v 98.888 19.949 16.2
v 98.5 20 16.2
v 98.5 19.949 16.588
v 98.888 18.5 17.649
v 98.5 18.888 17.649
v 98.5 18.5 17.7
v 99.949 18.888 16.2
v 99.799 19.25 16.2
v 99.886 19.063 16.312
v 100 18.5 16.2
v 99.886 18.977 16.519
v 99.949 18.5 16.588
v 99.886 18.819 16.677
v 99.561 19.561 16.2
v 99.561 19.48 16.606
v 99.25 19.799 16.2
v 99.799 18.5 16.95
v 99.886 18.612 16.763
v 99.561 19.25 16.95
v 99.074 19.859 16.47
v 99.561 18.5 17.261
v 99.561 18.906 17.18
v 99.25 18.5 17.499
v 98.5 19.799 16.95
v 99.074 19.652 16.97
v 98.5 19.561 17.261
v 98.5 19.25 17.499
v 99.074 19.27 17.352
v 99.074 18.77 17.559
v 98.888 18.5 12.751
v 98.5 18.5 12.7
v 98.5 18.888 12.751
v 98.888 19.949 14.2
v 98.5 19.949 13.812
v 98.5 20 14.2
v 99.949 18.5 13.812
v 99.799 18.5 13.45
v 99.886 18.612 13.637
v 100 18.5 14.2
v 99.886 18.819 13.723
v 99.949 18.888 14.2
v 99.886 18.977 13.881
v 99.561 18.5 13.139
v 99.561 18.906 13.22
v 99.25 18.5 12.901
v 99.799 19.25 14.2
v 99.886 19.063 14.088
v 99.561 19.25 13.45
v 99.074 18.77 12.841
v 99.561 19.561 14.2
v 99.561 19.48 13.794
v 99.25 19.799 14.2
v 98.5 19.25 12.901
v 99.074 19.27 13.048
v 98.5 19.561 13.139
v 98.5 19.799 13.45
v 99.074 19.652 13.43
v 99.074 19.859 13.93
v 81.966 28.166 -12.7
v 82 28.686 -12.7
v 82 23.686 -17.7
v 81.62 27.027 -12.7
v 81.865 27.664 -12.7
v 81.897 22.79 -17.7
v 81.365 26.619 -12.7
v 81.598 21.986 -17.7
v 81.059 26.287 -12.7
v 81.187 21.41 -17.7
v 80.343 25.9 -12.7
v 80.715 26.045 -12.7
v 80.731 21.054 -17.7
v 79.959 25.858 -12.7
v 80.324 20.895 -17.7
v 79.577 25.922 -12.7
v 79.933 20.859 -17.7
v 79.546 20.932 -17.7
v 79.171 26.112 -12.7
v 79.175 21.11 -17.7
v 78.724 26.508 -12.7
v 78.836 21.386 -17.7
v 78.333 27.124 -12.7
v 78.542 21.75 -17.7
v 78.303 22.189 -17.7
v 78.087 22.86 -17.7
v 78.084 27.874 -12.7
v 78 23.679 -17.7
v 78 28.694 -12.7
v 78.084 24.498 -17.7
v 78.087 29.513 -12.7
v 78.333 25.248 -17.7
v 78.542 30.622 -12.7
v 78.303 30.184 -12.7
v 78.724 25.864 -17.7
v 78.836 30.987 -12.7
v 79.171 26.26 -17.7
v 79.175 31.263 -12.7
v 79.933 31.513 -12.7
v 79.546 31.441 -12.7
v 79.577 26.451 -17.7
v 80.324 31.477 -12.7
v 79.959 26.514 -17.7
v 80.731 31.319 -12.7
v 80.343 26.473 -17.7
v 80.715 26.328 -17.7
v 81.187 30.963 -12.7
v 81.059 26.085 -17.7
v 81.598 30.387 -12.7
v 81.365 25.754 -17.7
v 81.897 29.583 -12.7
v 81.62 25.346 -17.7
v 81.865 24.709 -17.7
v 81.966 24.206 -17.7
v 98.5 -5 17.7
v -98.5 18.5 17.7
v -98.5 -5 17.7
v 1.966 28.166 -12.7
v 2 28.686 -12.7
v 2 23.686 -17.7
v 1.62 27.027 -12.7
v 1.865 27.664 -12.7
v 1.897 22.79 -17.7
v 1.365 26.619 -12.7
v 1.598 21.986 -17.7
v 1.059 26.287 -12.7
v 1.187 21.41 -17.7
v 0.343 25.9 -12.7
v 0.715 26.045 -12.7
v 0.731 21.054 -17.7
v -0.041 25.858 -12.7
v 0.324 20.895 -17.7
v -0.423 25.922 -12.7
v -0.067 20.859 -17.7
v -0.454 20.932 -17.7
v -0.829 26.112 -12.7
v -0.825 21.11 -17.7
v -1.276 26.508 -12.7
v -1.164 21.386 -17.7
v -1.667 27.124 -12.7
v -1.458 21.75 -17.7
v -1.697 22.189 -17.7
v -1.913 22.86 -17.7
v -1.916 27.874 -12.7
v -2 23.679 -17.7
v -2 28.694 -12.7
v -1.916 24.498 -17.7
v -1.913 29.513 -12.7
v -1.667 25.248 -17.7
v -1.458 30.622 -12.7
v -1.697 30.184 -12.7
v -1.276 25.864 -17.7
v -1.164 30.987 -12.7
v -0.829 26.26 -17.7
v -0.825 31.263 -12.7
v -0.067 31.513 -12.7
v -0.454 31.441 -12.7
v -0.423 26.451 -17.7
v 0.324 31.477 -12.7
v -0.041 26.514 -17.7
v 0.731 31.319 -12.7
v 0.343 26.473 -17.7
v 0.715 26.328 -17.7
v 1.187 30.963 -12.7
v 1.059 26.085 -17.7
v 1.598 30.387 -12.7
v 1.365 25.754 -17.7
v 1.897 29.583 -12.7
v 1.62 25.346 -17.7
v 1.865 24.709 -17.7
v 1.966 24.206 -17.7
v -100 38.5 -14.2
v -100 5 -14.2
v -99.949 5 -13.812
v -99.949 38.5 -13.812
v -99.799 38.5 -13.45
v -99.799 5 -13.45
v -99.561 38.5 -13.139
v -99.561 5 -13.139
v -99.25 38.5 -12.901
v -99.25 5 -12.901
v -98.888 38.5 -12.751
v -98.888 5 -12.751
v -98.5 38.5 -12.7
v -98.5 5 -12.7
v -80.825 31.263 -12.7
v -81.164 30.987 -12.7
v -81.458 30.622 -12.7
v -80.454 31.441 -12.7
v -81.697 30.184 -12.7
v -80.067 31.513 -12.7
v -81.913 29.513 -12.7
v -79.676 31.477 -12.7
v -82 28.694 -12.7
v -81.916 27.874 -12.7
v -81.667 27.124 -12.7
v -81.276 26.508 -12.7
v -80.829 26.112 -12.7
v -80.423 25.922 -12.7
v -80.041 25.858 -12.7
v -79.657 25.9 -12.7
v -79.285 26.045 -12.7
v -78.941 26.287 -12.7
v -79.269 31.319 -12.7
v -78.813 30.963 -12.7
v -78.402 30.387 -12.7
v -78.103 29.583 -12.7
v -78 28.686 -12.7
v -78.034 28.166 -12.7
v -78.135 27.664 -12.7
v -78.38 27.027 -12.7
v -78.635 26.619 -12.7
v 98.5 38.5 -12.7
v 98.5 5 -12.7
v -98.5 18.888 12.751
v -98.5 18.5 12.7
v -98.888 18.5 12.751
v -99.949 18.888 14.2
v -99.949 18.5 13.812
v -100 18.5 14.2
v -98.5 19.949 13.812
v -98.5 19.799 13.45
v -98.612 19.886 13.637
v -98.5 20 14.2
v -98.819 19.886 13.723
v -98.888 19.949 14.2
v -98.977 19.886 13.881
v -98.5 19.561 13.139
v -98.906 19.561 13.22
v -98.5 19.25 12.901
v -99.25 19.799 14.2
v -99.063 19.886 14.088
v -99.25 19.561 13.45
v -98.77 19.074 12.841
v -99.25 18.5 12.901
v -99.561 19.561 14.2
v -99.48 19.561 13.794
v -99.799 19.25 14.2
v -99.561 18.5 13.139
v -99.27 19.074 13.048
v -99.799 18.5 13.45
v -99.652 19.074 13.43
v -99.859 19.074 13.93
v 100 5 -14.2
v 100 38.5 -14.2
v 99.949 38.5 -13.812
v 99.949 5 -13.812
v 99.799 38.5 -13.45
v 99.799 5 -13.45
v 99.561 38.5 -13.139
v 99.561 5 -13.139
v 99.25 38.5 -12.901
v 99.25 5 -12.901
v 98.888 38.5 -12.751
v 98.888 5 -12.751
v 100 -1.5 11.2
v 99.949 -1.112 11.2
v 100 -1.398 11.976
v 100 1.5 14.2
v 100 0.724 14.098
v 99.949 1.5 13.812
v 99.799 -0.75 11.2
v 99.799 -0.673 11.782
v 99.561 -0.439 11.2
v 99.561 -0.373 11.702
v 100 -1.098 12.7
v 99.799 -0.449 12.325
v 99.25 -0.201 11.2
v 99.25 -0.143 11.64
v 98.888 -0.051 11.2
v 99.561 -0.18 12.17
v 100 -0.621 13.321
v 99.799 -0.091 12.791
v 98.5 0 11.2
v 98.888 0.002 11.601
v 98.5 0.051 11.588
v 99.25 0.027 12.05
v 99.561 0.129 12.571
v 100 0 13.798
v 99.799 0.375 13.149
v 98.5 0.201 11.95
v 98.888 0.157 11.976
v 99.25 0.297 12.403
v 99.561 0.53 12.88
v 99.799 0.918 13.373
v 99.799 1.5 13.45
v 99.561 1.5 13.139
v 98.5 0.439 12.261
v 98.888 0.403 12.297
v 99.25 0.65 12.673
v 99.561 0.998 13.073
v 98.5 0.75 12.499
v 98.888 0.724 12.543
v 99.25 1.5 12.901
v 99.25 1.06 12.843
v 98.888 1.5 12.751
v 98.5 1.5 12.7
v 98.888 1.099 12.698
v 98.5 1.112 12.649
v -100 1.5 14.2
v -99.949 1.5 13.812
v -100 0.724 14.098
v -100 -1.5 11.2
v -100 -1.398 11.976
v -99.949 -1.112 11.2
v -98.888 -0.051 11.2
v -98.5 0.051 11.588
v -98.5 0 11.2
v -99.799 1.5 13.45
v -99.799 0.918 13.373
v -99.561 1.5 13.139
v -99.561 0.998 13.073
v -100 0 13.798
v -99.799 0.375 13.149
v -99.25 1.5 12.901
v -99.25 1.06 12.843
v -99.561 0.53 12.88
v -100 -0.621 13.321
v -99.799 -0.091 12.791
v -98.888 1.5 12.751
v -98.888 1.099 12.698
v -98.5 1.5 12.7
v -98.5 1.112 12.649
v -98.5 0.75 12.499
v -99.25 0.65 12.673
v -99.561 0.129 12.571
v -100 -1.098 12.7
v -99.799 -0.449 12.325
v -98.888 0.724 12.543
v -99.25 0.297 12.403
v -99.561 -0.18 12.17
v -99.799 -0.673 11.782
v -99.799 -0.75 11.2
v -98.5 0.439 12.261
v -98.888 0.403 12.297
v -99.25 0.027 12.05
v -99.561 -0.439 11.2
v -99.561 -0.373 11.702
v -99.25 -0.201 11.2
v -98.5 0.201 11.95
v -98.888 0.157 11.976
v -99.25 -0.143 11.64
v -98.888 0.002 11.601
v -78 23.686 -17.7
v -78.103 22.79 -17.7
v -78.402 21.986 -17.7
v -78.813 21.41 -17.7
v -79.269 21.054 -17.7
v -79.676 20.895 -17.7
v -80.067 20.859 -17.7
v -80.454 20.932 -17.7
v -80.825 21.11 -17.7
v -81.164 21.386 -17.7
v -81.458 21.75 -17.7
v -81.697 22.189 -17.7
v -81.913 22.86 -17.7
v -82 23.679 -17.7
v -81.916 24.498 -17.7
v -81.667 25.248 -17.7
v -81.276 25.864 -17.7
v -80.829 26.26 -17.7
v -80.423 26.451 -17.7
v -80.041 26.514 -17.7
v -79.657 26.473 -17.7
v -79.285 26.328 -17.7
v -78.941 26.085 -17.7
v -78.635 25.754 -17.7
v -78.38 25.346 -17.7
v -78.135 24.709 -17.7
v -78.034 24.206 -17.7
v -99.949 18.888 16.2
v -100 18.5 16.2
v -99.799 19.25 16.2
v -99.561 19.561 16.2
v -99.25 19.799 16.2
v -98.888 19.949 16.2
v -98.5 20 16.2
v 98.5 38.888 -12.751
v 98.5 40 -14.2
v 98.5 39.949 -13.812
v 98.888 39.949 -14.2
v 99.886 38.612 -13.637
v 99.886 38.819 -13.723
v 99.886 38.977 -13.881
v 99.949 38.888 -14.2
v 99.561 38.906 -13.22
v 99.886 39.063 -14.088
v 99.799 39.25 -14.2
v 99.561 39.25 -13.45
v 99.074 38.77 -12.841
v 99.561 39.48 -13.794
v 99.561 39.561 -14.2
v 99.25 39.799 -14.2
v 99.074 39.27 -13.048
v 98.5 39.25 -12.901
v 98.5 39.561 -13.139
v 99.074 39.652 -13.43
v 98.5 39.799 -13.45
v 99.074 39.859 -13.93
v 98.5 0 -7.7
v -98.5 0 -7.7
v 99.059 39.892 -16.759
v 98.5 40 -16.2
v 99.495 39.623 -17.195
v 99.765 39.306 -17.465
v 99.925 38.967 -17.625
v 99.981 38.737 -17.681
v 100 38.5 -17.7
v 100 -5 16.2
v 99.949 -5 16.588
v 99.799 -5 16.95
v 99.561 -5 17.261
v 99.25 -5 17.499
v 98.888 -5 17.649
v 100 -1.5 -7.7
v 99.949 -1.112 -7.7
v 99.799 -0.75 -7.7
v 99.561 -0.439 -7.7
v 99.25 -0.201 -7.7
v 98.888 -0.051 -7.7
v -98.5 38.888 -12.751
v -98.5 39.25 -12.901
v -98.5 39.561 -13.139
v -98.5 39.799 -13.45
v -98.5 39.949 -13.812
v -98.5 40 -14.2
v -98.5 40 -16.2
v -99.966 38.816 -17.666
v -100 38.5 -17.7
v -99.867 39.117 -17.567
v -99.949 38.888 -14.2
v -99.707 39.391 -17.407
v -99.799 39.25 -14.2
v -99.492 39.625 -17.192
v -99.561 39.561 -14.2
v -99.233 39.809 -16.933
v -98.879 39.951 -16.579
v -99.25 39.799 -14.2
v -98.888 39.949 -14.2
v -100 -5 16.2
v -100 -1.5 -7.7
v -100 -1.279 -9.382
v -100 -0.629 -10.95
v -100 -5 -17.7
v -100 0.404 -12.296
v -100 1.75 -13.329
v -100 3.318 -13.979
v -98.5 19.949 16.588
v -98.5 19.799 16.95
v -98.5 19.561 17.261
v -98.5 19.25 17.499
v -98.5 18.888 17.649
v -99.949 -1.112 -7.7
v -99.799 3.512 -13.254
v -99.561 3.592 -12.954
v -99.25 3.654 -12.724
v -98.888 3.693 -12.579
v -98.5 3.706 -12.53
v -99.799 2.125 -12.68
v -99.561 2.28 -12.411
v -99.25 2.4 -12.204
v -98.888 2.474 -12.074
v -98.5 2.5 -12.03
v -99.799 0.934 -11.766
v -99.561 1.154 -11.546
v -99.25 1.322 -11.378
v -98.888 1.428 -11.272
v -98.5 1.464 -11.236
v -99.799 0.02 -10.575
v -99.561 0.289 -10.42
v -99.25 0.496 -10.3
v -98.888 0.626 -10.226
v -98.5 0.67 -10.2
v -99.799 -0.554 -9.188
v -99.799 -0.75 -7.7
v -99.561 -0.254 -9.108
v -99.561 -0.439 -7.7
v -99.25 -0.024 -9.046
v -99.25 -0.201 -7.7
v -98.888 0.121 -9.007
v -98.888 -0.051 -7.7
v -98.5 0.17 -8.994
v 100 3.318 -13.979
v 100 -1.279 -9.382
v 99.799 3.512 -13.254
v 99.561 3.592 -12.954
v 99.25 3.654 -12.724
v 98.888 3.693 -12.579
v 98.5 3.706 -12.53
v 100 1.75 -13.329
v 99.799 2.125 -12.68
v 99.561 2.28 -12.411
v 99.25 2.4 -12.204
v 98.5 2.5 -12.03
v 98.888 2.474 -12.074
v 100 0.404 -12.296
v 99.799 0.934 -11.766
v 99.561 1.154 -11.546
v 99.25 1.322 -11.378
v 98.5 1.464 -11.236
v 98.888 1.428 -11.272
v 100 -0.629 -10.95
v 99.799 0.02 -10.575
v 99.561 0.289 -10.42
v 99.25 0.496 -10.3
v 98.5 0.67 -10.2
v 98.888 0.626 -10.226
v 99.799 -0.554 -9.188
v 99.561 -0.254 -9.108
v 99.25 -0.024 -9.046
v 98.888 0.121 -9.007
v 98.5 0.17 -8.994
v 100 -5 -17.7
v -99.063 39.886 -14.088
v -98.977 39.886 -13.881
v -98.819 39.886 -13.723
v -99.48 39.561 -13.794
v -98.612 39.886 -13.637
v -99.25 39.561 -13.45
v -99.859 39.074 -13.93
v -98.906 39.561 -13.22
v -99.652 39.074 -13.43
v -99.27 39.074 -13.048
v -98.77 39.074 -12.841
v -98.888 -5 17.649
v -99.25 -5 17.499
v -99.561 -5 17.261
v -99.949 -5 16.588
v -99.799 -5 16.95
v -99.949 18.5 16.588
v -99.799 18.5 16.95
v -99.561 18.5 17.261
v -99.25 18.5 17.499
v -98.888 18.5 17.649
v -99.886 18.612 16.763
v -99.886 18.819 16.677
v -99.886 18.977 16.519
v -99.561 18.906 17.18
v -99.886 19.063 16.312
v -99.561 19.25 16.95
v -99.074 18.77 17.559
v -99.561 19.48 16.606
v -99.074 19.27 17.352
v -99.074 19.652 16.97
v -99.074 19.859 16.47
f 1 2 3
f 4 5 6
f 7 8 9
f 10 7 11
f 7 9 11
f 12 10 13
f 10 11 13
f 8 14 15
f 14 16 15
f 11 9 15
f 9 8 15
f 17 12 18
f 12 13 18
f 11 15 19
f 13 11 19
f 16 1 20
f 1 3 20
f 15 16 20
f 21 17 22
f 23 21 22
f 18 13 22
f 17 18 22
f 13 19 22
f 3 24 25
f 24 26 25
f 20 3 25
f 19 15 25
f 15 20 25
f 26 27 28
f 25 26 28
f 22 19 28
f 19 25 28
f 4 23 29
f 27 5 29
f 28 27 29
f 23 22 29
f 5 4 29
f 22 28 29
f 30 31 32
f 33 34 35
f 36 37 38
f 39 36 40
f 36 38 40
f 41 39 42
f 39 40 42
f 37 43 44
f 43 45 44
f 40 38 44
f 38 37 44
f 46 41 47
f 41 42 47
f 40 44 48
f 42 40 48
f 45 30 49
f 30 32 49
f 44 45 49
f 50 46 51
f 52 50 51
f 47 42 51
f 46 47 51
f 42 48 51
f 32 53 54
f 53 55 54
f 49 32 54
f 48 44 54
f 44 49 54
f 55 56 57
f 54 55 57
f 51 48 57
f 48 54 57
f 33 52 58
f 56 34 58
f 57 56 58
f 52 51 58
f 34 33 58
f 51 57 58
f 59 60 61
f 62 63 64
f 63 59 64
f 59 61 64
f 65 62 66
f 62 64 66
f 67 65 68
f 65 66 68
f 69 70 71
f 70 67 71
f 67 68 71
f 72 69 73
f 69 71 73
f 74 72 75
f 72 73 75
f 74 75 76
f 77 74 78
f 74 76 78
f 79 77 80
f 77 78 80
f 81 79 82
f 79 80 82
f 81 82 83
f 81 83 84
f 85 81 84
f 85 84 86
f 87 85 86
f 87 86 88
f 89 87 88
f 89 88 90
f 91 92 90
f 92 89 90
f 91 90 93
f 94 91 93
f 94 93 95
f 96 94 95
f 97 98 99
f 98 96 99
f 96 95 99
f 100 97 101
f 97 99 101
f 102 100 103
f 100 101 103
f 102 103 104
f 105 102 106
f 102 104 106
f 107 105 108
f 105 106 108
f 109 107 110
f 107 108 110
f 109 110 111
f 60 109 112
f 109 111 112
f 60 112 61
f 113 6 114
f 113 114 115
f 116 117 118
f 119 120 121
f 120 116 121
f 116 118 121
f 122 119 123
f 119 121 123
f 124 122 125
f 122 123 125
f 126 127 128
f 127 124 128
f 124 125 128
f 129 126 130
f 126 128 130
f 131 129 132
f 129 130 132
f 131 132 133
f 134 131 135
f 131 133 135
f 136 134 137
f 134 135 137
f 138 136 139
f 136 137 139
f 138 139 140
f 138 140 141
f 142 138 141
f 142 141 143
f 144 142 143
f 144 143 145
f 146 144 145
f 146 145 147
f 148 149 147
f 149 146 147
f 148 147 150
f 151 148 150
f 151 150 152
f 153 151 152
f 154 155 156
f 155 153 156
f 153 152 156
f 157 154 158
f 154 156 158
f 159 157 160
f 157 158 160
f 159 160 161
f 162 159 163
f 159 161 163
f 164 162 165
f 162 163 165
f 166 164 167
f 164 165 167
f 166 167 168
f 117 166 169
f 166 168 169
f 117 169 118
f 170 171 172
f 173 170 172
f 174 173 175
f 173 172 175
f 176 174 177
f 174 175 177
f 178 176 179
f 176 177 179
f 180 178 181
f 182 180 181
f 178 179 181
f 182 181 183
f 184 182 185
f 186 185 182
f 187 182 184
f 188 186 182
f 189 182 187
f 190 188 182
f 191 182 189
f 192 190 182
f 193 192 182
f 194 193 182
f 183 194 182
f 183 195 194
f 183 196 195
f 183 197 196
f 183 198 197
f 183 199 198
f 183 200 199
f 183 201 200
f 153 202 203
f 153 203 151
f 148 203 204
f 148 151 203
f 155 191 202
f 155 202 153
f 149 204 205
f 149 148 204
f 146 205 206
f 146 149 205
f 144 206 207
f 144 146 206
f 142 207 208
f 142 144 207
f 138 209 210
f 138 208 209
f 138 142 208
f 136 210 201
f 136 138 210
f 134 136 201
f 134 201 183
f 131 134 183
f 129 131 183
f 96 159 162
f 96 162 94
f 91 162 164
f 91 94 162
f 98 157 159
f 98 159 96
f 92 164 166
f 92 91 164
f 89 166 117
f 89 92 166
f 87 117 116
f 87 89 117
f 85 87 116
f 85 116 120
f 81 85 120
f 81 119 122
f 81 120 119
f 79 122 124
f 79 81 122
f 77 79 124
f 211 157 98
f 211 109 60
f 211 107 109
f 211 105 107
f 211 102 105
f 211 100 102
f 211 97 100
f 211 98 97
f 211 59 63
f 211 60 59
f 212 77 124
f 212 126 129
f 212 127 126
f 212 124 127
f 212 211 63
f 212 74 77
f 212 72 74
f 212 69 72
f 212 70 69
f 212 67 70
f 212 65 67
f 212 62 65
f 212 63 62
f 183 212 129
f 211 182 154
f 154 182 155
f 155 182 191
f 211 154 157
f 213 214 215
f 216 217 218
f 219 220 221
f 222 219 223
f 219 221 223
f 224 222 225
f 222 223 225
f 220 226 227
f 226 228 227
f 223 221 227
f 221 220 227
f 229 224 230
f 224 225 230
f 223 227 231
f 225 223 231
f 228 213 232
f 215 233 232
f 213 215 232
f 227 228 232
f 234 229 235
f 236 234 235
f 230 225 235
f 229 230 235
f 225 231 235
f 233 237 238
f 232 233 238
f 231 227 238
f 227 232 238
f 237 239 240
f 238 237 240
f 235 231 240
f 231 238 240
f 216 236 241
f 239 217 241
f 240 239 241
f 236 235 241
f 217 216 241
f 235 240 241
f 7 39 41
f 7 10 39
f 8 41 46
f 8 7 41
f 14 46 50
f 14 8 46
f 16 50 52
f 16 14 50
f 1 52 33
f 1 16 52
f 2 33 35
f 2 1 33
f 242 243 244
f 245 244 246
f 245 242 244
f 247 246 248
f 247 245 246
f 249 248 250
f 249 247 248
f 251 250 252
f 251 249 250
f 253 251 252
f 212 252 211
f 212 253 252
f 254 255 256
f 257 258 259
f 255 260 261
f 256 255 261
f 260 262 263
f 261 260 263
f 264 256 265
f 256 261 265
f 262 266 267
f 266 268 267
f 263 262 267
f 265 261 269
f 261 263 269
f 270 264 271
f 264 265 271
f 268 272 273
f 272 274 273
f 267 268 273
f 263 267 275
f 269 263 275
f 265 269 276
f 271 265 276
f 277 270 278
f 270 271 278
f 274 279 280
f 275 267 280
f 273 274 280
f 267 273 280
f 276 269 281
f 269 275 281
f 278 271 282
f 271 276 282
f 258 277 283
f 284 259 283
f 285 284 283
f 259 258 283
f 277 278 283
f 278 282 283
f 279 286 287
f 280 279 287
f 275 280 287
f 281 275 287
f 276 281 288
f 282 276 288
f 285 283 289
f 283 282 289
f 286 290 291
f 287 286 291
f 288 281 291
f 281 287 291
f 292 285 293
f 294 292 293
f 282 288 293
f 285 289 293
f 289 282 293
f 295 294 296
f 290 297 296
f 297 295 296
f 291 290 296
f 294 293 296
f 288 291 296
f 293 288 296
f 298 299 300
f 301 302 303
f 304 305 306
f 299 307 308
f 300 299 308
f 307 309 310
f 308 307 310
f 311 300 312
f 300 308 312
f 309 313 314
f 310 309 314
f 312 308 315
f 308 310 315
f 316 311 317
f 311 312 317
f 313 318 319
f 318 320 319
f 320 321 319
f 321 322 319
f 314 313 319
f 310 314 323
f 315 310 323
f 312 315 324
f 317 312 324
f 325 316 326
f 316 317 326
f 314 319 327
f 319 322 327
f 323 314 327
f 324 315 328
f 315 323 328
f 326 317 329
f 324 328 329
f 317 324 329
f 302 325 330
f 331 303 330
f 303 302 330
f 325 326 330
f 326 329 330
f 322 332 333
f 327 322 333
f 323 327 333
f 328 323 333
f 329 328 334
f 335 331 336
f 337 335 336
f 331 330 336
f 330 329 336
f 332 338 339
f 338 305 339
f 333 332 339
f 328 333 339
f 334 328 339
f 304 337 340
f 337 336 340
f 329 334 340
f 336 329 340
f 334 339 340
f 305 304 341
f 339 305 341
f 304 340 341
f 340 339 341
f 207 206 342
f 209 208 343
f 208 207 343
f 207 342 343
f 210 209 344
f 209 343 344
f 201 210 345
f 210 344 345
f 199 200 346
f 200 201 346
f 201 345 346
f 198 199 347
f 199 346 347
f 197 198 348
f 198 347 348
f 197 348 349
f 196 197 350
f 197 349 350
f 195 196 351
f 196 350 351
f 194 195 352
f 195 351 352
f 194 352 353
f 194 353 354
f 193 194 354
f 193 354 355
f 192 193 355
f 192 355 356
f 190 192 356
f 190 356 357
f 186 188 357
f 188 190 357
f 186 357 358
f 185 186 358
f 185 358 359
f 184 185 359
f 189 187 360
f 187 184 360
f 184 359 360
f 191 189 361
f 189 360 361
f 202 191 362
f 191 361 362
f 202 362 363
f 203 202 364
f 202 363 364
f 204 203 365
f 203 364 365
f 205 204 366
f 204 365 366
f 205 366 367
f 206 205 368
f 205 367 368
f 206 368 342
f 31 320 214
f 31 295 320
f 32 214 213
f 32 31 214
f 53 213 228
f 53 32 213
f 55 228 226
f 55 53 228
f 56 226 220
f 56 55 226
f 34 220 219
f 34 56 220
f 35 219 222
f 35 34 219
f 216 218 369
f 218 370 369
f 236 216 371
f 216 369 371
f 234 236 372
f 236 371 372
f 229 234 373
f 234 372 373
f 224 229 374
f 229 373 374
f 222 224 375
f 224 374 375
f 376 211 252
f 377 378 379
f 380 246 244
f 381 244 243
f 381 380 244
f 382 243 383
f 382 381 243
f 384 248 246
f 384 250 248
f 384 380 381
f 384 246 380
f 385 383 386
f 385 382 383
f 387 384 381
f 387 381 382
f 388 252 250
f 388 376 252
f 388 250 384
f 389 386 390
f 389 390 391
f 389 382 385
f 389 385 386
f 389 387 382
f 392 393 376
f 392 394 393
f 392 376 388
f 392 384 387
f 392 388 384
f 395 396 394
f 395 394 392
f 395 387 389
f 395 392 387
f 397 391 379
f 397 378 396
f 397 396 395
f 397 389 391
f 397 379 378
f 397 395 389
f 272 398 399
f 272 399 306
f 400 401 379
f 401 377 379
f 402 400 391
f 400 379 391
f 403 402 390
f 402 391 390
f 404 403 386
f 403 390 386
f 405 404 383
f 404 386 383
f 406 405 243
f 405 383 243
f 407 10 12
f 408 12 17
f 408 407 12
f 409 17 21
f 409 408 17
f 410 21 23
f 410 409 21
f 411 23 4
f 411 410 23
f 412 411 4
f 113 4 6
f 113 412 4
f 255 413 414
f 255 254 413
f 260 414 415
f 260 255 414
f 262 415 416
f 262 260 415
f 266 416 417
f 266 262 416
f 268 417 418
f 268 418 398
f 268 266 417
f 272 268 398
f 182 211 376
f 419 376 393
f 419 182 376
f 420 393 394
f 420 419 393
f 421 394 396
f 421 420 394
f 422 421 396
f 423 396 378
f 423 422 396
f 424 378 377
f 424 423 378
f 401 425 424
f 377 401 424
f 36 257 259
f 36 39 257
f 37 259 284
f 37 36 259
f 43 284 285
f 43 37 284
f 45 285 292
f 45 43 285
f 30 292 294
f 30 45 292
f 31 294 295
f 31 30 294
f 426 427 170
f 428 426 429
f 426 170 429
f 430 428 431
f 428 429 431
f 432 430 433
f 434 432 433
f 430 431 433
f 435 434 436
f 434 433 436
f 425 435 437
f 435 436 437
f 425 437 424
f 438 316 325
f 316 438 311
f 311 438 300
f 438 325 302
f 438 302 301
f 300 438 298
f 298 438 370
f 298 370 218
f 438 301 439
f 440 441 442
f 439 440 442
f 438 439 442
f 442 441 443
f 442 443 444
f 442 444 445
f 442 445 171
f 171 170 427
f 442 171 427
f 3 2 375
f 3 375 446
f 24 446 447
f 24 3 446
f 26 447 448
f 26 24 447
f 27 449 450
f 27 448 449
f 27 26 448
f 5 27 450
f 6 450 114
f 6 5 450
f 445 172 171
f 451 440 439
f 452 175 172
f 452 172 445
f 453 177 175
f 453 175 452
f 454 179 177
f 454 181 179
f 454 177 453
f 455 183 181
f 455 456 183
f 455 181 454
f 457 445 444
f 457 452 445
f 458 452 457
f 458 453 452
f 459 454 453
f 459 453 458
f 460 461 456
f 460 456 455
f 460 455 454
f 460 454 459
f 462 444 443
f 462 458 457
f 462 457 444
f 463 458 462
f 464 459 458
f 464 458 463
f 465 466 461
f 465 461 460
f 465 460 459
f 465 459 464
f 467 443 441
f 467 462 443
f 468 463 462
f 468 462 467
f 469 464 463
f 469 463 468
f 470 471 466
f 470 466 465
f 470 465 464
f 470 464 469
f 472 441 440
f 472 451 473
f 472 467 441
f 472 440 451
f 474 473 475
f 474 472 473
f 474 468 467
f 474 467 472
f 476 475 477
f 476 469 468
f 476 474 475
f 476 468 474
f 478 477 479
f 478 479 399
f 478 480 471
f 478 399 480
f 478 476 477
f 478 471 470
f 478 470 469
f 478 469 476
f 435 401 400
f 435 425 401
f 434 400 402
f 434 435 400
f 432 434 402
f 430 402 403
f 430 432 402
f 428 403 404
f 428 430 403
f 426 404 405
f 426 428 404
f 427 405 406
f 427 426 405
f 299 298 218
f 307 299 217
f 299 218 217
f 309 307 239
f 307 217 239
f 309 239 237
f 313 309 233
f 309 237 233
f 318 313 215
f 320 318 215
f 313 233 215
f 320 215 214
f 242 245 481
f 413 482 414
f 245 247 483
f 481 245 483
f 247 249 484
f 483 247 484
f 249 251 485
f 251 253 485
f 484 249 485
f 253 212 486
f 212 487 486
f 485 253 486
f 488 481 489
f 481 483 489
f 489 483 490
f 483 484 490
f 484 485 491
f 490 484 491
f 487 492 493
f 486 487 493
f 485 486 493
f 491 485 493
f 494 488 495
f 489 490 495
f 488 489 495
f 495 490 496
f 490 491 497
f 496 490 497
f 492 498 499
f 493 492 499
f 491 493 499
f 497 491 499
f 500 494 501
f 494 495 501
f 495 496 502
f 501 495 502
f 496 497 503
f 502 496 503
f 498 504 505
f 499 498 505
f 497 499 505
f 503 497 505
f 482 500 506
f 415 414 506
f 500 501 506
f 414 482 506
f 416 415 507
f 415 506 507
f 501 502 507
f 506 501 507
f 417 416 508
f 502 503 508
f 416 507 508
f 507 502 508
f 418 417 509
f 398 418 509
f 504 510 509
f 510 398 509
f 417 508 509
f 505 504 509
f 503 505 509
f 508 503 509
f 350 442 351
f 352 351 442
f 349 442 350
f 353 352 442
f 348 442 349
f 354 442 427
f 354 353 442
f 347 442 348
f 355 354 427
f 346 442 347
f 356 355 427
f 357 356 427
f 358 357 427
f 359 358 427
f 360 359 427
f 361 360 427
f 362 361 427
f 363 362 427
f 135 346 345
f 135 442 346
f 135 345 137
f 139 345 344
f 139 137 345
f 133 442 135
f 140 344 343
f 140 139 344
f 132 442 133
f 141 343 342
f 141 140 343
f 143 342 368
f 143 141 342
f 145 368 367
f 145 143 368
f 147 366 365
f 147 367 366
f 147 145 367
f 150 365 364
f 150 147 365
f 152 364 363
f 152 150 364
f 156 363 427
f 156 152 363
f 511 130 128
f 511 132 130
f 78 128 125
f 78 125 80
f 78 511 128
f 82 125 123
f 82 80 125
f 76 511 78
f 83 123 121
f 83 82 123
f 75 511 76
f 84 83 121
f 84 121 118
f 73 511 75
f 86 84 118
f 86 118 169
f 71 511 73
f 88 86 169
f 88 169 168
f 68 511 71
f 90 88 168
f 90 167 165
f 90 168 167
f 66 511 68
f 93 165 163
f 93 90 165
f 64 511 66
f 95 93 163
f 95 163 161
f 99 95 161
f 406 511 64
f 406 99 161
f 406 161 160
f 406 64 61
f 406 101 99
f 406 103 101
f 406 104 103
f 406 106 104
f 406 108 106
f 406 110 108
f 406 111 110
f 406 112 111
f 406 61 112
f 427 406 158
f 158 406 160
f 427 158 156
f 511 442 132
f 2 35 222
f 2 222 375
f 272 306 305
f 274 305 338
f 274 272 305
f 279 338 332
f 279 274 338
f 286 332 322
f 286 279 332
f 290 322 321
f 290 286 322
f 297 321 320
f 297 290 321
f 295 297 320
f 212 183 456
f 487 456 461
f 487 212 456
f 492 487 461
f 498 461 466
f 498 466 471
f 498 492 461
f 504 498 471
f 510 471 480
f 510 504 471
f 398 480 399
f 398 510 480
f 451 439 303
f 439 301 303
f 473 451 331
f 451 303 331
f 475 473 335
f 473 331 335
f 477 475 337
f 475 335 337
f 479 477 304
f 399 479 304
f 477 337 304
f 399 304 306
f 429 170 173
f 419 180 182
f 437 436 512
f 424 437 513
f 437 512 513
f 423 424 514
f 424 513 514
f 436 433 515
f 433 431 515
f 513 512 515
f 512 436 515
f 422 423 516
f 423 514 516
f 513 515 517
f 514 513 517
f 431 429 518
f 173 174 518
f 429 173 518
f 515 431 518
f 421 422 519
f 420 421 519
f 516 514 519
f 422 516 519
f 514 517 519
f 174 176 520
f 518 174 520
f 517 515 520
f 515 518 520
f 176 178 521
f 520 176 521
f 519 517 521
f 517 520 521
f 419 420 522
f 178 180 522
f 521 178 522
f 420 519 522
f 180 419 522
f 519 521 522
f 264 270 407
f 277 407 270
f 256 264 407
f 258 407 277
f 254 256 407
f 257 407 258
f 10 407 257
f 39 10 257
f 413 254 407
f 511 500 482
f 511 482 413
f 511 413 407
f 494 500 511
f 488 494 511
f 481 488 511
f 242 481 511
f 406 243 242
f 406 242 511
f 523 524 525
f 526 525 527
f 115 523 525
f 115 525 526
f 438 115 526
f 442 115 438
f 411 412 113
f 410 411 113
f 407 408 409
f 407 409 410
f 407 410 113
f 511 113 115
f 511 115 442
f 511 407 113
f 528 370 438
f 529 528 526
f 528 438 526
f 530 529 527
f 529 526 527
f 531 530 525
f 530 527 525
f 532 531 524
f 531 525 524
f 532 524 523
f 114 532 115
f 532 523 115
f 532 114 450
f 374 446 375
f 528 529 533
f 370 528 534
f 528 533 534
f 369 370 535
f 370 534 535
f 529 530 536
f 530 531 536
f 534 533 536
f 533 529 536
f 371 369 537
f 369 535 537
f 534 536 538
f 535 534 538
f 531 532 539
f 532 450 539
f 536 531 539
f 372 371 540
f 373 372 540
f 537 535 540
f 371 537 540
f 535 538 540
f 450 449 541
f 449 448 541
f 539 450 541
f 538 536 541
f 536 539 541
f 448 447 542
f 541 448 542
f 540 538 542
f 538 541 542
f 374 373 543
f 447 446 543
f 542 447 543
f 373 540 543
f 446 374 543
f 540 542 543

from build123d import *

# Parameters (mm, degrees)
EXTRUDE_THIN1_DEPTH      = 100
F_4_0_4_DIAMETER_HOLE1_D = 4
FILLET3_R                = 5
FILLET2_R                = 1.5


with BuildPart() as part:
    # Sketch1 → Extrude-Thin1 (new body, symmetric)
    with BuildSketch(Plane(origin=(0, 0, 0), x_dir=(0, 0, -1), z_dir=(1, 0, 0))):
        Polygon((12.7, 40), (12.7, 0), (0, 0), (-12.7, 0), (-12.7, 20), (-17.7, 20), (-17.7, -5), (0, -5), (17.7, -5), (17.7, 40), align=None)
    extrude(amount=EXTRUDE_THIN1_DEPTH, both=True)

    # Ø4.0 (4) Diameter Hole1 (through all)
    with Locations(Plane(origin=(0, 13.65, 13.65), x_dir=(-1, 0, 0), z_dir=(0, 0.707106781, 0.707106781))):
        with Locations((80, -29.264527369), (-80, -29.264527369), (0, -29.264527369)):
            Hole(F_4_0_4_DIAMETER_HOLE1_D / 2)

    # Fillet3
    fillet3_edges = [part.edges().sort_by_distance(p)[0] for p in [
        (0, 0, -12.7),
    ]]
    fillet(fillet3_edges, radius=FILLET3_R)

    # Fillet2
    fillet2_edges = [part.edges().sort_by_distance(p)[0] for p in [
        (-100, 10, 12.7),
        (-100, 0, 2.5),
        (-100, 40, -15.2),
        (0, 20, 17.7),
        (0, 20, 12.7),
        (0, 0, 12.7),
        (0, 40, -12.7),
        (0, 40, -17.7),
        (100, 0, 2.5),
        (100, 10, 12.7),
        (100, 20, 15.2),
        (100, 7.5, 17.7),
        (-100, 22.5, -12.7),
        (100, 22.5, -12.7),
        (-100, 1.464466094, -11.235533906),
        (100, 1.464466094, -11.235533906),
        (100, 40, -15.2),
        (-100, 7.5, 17.7),
        (-100, 20, 15.2),
    ]]
    fillet(fillet2_edges, radius=FILLET2_R)


solid = part.part
